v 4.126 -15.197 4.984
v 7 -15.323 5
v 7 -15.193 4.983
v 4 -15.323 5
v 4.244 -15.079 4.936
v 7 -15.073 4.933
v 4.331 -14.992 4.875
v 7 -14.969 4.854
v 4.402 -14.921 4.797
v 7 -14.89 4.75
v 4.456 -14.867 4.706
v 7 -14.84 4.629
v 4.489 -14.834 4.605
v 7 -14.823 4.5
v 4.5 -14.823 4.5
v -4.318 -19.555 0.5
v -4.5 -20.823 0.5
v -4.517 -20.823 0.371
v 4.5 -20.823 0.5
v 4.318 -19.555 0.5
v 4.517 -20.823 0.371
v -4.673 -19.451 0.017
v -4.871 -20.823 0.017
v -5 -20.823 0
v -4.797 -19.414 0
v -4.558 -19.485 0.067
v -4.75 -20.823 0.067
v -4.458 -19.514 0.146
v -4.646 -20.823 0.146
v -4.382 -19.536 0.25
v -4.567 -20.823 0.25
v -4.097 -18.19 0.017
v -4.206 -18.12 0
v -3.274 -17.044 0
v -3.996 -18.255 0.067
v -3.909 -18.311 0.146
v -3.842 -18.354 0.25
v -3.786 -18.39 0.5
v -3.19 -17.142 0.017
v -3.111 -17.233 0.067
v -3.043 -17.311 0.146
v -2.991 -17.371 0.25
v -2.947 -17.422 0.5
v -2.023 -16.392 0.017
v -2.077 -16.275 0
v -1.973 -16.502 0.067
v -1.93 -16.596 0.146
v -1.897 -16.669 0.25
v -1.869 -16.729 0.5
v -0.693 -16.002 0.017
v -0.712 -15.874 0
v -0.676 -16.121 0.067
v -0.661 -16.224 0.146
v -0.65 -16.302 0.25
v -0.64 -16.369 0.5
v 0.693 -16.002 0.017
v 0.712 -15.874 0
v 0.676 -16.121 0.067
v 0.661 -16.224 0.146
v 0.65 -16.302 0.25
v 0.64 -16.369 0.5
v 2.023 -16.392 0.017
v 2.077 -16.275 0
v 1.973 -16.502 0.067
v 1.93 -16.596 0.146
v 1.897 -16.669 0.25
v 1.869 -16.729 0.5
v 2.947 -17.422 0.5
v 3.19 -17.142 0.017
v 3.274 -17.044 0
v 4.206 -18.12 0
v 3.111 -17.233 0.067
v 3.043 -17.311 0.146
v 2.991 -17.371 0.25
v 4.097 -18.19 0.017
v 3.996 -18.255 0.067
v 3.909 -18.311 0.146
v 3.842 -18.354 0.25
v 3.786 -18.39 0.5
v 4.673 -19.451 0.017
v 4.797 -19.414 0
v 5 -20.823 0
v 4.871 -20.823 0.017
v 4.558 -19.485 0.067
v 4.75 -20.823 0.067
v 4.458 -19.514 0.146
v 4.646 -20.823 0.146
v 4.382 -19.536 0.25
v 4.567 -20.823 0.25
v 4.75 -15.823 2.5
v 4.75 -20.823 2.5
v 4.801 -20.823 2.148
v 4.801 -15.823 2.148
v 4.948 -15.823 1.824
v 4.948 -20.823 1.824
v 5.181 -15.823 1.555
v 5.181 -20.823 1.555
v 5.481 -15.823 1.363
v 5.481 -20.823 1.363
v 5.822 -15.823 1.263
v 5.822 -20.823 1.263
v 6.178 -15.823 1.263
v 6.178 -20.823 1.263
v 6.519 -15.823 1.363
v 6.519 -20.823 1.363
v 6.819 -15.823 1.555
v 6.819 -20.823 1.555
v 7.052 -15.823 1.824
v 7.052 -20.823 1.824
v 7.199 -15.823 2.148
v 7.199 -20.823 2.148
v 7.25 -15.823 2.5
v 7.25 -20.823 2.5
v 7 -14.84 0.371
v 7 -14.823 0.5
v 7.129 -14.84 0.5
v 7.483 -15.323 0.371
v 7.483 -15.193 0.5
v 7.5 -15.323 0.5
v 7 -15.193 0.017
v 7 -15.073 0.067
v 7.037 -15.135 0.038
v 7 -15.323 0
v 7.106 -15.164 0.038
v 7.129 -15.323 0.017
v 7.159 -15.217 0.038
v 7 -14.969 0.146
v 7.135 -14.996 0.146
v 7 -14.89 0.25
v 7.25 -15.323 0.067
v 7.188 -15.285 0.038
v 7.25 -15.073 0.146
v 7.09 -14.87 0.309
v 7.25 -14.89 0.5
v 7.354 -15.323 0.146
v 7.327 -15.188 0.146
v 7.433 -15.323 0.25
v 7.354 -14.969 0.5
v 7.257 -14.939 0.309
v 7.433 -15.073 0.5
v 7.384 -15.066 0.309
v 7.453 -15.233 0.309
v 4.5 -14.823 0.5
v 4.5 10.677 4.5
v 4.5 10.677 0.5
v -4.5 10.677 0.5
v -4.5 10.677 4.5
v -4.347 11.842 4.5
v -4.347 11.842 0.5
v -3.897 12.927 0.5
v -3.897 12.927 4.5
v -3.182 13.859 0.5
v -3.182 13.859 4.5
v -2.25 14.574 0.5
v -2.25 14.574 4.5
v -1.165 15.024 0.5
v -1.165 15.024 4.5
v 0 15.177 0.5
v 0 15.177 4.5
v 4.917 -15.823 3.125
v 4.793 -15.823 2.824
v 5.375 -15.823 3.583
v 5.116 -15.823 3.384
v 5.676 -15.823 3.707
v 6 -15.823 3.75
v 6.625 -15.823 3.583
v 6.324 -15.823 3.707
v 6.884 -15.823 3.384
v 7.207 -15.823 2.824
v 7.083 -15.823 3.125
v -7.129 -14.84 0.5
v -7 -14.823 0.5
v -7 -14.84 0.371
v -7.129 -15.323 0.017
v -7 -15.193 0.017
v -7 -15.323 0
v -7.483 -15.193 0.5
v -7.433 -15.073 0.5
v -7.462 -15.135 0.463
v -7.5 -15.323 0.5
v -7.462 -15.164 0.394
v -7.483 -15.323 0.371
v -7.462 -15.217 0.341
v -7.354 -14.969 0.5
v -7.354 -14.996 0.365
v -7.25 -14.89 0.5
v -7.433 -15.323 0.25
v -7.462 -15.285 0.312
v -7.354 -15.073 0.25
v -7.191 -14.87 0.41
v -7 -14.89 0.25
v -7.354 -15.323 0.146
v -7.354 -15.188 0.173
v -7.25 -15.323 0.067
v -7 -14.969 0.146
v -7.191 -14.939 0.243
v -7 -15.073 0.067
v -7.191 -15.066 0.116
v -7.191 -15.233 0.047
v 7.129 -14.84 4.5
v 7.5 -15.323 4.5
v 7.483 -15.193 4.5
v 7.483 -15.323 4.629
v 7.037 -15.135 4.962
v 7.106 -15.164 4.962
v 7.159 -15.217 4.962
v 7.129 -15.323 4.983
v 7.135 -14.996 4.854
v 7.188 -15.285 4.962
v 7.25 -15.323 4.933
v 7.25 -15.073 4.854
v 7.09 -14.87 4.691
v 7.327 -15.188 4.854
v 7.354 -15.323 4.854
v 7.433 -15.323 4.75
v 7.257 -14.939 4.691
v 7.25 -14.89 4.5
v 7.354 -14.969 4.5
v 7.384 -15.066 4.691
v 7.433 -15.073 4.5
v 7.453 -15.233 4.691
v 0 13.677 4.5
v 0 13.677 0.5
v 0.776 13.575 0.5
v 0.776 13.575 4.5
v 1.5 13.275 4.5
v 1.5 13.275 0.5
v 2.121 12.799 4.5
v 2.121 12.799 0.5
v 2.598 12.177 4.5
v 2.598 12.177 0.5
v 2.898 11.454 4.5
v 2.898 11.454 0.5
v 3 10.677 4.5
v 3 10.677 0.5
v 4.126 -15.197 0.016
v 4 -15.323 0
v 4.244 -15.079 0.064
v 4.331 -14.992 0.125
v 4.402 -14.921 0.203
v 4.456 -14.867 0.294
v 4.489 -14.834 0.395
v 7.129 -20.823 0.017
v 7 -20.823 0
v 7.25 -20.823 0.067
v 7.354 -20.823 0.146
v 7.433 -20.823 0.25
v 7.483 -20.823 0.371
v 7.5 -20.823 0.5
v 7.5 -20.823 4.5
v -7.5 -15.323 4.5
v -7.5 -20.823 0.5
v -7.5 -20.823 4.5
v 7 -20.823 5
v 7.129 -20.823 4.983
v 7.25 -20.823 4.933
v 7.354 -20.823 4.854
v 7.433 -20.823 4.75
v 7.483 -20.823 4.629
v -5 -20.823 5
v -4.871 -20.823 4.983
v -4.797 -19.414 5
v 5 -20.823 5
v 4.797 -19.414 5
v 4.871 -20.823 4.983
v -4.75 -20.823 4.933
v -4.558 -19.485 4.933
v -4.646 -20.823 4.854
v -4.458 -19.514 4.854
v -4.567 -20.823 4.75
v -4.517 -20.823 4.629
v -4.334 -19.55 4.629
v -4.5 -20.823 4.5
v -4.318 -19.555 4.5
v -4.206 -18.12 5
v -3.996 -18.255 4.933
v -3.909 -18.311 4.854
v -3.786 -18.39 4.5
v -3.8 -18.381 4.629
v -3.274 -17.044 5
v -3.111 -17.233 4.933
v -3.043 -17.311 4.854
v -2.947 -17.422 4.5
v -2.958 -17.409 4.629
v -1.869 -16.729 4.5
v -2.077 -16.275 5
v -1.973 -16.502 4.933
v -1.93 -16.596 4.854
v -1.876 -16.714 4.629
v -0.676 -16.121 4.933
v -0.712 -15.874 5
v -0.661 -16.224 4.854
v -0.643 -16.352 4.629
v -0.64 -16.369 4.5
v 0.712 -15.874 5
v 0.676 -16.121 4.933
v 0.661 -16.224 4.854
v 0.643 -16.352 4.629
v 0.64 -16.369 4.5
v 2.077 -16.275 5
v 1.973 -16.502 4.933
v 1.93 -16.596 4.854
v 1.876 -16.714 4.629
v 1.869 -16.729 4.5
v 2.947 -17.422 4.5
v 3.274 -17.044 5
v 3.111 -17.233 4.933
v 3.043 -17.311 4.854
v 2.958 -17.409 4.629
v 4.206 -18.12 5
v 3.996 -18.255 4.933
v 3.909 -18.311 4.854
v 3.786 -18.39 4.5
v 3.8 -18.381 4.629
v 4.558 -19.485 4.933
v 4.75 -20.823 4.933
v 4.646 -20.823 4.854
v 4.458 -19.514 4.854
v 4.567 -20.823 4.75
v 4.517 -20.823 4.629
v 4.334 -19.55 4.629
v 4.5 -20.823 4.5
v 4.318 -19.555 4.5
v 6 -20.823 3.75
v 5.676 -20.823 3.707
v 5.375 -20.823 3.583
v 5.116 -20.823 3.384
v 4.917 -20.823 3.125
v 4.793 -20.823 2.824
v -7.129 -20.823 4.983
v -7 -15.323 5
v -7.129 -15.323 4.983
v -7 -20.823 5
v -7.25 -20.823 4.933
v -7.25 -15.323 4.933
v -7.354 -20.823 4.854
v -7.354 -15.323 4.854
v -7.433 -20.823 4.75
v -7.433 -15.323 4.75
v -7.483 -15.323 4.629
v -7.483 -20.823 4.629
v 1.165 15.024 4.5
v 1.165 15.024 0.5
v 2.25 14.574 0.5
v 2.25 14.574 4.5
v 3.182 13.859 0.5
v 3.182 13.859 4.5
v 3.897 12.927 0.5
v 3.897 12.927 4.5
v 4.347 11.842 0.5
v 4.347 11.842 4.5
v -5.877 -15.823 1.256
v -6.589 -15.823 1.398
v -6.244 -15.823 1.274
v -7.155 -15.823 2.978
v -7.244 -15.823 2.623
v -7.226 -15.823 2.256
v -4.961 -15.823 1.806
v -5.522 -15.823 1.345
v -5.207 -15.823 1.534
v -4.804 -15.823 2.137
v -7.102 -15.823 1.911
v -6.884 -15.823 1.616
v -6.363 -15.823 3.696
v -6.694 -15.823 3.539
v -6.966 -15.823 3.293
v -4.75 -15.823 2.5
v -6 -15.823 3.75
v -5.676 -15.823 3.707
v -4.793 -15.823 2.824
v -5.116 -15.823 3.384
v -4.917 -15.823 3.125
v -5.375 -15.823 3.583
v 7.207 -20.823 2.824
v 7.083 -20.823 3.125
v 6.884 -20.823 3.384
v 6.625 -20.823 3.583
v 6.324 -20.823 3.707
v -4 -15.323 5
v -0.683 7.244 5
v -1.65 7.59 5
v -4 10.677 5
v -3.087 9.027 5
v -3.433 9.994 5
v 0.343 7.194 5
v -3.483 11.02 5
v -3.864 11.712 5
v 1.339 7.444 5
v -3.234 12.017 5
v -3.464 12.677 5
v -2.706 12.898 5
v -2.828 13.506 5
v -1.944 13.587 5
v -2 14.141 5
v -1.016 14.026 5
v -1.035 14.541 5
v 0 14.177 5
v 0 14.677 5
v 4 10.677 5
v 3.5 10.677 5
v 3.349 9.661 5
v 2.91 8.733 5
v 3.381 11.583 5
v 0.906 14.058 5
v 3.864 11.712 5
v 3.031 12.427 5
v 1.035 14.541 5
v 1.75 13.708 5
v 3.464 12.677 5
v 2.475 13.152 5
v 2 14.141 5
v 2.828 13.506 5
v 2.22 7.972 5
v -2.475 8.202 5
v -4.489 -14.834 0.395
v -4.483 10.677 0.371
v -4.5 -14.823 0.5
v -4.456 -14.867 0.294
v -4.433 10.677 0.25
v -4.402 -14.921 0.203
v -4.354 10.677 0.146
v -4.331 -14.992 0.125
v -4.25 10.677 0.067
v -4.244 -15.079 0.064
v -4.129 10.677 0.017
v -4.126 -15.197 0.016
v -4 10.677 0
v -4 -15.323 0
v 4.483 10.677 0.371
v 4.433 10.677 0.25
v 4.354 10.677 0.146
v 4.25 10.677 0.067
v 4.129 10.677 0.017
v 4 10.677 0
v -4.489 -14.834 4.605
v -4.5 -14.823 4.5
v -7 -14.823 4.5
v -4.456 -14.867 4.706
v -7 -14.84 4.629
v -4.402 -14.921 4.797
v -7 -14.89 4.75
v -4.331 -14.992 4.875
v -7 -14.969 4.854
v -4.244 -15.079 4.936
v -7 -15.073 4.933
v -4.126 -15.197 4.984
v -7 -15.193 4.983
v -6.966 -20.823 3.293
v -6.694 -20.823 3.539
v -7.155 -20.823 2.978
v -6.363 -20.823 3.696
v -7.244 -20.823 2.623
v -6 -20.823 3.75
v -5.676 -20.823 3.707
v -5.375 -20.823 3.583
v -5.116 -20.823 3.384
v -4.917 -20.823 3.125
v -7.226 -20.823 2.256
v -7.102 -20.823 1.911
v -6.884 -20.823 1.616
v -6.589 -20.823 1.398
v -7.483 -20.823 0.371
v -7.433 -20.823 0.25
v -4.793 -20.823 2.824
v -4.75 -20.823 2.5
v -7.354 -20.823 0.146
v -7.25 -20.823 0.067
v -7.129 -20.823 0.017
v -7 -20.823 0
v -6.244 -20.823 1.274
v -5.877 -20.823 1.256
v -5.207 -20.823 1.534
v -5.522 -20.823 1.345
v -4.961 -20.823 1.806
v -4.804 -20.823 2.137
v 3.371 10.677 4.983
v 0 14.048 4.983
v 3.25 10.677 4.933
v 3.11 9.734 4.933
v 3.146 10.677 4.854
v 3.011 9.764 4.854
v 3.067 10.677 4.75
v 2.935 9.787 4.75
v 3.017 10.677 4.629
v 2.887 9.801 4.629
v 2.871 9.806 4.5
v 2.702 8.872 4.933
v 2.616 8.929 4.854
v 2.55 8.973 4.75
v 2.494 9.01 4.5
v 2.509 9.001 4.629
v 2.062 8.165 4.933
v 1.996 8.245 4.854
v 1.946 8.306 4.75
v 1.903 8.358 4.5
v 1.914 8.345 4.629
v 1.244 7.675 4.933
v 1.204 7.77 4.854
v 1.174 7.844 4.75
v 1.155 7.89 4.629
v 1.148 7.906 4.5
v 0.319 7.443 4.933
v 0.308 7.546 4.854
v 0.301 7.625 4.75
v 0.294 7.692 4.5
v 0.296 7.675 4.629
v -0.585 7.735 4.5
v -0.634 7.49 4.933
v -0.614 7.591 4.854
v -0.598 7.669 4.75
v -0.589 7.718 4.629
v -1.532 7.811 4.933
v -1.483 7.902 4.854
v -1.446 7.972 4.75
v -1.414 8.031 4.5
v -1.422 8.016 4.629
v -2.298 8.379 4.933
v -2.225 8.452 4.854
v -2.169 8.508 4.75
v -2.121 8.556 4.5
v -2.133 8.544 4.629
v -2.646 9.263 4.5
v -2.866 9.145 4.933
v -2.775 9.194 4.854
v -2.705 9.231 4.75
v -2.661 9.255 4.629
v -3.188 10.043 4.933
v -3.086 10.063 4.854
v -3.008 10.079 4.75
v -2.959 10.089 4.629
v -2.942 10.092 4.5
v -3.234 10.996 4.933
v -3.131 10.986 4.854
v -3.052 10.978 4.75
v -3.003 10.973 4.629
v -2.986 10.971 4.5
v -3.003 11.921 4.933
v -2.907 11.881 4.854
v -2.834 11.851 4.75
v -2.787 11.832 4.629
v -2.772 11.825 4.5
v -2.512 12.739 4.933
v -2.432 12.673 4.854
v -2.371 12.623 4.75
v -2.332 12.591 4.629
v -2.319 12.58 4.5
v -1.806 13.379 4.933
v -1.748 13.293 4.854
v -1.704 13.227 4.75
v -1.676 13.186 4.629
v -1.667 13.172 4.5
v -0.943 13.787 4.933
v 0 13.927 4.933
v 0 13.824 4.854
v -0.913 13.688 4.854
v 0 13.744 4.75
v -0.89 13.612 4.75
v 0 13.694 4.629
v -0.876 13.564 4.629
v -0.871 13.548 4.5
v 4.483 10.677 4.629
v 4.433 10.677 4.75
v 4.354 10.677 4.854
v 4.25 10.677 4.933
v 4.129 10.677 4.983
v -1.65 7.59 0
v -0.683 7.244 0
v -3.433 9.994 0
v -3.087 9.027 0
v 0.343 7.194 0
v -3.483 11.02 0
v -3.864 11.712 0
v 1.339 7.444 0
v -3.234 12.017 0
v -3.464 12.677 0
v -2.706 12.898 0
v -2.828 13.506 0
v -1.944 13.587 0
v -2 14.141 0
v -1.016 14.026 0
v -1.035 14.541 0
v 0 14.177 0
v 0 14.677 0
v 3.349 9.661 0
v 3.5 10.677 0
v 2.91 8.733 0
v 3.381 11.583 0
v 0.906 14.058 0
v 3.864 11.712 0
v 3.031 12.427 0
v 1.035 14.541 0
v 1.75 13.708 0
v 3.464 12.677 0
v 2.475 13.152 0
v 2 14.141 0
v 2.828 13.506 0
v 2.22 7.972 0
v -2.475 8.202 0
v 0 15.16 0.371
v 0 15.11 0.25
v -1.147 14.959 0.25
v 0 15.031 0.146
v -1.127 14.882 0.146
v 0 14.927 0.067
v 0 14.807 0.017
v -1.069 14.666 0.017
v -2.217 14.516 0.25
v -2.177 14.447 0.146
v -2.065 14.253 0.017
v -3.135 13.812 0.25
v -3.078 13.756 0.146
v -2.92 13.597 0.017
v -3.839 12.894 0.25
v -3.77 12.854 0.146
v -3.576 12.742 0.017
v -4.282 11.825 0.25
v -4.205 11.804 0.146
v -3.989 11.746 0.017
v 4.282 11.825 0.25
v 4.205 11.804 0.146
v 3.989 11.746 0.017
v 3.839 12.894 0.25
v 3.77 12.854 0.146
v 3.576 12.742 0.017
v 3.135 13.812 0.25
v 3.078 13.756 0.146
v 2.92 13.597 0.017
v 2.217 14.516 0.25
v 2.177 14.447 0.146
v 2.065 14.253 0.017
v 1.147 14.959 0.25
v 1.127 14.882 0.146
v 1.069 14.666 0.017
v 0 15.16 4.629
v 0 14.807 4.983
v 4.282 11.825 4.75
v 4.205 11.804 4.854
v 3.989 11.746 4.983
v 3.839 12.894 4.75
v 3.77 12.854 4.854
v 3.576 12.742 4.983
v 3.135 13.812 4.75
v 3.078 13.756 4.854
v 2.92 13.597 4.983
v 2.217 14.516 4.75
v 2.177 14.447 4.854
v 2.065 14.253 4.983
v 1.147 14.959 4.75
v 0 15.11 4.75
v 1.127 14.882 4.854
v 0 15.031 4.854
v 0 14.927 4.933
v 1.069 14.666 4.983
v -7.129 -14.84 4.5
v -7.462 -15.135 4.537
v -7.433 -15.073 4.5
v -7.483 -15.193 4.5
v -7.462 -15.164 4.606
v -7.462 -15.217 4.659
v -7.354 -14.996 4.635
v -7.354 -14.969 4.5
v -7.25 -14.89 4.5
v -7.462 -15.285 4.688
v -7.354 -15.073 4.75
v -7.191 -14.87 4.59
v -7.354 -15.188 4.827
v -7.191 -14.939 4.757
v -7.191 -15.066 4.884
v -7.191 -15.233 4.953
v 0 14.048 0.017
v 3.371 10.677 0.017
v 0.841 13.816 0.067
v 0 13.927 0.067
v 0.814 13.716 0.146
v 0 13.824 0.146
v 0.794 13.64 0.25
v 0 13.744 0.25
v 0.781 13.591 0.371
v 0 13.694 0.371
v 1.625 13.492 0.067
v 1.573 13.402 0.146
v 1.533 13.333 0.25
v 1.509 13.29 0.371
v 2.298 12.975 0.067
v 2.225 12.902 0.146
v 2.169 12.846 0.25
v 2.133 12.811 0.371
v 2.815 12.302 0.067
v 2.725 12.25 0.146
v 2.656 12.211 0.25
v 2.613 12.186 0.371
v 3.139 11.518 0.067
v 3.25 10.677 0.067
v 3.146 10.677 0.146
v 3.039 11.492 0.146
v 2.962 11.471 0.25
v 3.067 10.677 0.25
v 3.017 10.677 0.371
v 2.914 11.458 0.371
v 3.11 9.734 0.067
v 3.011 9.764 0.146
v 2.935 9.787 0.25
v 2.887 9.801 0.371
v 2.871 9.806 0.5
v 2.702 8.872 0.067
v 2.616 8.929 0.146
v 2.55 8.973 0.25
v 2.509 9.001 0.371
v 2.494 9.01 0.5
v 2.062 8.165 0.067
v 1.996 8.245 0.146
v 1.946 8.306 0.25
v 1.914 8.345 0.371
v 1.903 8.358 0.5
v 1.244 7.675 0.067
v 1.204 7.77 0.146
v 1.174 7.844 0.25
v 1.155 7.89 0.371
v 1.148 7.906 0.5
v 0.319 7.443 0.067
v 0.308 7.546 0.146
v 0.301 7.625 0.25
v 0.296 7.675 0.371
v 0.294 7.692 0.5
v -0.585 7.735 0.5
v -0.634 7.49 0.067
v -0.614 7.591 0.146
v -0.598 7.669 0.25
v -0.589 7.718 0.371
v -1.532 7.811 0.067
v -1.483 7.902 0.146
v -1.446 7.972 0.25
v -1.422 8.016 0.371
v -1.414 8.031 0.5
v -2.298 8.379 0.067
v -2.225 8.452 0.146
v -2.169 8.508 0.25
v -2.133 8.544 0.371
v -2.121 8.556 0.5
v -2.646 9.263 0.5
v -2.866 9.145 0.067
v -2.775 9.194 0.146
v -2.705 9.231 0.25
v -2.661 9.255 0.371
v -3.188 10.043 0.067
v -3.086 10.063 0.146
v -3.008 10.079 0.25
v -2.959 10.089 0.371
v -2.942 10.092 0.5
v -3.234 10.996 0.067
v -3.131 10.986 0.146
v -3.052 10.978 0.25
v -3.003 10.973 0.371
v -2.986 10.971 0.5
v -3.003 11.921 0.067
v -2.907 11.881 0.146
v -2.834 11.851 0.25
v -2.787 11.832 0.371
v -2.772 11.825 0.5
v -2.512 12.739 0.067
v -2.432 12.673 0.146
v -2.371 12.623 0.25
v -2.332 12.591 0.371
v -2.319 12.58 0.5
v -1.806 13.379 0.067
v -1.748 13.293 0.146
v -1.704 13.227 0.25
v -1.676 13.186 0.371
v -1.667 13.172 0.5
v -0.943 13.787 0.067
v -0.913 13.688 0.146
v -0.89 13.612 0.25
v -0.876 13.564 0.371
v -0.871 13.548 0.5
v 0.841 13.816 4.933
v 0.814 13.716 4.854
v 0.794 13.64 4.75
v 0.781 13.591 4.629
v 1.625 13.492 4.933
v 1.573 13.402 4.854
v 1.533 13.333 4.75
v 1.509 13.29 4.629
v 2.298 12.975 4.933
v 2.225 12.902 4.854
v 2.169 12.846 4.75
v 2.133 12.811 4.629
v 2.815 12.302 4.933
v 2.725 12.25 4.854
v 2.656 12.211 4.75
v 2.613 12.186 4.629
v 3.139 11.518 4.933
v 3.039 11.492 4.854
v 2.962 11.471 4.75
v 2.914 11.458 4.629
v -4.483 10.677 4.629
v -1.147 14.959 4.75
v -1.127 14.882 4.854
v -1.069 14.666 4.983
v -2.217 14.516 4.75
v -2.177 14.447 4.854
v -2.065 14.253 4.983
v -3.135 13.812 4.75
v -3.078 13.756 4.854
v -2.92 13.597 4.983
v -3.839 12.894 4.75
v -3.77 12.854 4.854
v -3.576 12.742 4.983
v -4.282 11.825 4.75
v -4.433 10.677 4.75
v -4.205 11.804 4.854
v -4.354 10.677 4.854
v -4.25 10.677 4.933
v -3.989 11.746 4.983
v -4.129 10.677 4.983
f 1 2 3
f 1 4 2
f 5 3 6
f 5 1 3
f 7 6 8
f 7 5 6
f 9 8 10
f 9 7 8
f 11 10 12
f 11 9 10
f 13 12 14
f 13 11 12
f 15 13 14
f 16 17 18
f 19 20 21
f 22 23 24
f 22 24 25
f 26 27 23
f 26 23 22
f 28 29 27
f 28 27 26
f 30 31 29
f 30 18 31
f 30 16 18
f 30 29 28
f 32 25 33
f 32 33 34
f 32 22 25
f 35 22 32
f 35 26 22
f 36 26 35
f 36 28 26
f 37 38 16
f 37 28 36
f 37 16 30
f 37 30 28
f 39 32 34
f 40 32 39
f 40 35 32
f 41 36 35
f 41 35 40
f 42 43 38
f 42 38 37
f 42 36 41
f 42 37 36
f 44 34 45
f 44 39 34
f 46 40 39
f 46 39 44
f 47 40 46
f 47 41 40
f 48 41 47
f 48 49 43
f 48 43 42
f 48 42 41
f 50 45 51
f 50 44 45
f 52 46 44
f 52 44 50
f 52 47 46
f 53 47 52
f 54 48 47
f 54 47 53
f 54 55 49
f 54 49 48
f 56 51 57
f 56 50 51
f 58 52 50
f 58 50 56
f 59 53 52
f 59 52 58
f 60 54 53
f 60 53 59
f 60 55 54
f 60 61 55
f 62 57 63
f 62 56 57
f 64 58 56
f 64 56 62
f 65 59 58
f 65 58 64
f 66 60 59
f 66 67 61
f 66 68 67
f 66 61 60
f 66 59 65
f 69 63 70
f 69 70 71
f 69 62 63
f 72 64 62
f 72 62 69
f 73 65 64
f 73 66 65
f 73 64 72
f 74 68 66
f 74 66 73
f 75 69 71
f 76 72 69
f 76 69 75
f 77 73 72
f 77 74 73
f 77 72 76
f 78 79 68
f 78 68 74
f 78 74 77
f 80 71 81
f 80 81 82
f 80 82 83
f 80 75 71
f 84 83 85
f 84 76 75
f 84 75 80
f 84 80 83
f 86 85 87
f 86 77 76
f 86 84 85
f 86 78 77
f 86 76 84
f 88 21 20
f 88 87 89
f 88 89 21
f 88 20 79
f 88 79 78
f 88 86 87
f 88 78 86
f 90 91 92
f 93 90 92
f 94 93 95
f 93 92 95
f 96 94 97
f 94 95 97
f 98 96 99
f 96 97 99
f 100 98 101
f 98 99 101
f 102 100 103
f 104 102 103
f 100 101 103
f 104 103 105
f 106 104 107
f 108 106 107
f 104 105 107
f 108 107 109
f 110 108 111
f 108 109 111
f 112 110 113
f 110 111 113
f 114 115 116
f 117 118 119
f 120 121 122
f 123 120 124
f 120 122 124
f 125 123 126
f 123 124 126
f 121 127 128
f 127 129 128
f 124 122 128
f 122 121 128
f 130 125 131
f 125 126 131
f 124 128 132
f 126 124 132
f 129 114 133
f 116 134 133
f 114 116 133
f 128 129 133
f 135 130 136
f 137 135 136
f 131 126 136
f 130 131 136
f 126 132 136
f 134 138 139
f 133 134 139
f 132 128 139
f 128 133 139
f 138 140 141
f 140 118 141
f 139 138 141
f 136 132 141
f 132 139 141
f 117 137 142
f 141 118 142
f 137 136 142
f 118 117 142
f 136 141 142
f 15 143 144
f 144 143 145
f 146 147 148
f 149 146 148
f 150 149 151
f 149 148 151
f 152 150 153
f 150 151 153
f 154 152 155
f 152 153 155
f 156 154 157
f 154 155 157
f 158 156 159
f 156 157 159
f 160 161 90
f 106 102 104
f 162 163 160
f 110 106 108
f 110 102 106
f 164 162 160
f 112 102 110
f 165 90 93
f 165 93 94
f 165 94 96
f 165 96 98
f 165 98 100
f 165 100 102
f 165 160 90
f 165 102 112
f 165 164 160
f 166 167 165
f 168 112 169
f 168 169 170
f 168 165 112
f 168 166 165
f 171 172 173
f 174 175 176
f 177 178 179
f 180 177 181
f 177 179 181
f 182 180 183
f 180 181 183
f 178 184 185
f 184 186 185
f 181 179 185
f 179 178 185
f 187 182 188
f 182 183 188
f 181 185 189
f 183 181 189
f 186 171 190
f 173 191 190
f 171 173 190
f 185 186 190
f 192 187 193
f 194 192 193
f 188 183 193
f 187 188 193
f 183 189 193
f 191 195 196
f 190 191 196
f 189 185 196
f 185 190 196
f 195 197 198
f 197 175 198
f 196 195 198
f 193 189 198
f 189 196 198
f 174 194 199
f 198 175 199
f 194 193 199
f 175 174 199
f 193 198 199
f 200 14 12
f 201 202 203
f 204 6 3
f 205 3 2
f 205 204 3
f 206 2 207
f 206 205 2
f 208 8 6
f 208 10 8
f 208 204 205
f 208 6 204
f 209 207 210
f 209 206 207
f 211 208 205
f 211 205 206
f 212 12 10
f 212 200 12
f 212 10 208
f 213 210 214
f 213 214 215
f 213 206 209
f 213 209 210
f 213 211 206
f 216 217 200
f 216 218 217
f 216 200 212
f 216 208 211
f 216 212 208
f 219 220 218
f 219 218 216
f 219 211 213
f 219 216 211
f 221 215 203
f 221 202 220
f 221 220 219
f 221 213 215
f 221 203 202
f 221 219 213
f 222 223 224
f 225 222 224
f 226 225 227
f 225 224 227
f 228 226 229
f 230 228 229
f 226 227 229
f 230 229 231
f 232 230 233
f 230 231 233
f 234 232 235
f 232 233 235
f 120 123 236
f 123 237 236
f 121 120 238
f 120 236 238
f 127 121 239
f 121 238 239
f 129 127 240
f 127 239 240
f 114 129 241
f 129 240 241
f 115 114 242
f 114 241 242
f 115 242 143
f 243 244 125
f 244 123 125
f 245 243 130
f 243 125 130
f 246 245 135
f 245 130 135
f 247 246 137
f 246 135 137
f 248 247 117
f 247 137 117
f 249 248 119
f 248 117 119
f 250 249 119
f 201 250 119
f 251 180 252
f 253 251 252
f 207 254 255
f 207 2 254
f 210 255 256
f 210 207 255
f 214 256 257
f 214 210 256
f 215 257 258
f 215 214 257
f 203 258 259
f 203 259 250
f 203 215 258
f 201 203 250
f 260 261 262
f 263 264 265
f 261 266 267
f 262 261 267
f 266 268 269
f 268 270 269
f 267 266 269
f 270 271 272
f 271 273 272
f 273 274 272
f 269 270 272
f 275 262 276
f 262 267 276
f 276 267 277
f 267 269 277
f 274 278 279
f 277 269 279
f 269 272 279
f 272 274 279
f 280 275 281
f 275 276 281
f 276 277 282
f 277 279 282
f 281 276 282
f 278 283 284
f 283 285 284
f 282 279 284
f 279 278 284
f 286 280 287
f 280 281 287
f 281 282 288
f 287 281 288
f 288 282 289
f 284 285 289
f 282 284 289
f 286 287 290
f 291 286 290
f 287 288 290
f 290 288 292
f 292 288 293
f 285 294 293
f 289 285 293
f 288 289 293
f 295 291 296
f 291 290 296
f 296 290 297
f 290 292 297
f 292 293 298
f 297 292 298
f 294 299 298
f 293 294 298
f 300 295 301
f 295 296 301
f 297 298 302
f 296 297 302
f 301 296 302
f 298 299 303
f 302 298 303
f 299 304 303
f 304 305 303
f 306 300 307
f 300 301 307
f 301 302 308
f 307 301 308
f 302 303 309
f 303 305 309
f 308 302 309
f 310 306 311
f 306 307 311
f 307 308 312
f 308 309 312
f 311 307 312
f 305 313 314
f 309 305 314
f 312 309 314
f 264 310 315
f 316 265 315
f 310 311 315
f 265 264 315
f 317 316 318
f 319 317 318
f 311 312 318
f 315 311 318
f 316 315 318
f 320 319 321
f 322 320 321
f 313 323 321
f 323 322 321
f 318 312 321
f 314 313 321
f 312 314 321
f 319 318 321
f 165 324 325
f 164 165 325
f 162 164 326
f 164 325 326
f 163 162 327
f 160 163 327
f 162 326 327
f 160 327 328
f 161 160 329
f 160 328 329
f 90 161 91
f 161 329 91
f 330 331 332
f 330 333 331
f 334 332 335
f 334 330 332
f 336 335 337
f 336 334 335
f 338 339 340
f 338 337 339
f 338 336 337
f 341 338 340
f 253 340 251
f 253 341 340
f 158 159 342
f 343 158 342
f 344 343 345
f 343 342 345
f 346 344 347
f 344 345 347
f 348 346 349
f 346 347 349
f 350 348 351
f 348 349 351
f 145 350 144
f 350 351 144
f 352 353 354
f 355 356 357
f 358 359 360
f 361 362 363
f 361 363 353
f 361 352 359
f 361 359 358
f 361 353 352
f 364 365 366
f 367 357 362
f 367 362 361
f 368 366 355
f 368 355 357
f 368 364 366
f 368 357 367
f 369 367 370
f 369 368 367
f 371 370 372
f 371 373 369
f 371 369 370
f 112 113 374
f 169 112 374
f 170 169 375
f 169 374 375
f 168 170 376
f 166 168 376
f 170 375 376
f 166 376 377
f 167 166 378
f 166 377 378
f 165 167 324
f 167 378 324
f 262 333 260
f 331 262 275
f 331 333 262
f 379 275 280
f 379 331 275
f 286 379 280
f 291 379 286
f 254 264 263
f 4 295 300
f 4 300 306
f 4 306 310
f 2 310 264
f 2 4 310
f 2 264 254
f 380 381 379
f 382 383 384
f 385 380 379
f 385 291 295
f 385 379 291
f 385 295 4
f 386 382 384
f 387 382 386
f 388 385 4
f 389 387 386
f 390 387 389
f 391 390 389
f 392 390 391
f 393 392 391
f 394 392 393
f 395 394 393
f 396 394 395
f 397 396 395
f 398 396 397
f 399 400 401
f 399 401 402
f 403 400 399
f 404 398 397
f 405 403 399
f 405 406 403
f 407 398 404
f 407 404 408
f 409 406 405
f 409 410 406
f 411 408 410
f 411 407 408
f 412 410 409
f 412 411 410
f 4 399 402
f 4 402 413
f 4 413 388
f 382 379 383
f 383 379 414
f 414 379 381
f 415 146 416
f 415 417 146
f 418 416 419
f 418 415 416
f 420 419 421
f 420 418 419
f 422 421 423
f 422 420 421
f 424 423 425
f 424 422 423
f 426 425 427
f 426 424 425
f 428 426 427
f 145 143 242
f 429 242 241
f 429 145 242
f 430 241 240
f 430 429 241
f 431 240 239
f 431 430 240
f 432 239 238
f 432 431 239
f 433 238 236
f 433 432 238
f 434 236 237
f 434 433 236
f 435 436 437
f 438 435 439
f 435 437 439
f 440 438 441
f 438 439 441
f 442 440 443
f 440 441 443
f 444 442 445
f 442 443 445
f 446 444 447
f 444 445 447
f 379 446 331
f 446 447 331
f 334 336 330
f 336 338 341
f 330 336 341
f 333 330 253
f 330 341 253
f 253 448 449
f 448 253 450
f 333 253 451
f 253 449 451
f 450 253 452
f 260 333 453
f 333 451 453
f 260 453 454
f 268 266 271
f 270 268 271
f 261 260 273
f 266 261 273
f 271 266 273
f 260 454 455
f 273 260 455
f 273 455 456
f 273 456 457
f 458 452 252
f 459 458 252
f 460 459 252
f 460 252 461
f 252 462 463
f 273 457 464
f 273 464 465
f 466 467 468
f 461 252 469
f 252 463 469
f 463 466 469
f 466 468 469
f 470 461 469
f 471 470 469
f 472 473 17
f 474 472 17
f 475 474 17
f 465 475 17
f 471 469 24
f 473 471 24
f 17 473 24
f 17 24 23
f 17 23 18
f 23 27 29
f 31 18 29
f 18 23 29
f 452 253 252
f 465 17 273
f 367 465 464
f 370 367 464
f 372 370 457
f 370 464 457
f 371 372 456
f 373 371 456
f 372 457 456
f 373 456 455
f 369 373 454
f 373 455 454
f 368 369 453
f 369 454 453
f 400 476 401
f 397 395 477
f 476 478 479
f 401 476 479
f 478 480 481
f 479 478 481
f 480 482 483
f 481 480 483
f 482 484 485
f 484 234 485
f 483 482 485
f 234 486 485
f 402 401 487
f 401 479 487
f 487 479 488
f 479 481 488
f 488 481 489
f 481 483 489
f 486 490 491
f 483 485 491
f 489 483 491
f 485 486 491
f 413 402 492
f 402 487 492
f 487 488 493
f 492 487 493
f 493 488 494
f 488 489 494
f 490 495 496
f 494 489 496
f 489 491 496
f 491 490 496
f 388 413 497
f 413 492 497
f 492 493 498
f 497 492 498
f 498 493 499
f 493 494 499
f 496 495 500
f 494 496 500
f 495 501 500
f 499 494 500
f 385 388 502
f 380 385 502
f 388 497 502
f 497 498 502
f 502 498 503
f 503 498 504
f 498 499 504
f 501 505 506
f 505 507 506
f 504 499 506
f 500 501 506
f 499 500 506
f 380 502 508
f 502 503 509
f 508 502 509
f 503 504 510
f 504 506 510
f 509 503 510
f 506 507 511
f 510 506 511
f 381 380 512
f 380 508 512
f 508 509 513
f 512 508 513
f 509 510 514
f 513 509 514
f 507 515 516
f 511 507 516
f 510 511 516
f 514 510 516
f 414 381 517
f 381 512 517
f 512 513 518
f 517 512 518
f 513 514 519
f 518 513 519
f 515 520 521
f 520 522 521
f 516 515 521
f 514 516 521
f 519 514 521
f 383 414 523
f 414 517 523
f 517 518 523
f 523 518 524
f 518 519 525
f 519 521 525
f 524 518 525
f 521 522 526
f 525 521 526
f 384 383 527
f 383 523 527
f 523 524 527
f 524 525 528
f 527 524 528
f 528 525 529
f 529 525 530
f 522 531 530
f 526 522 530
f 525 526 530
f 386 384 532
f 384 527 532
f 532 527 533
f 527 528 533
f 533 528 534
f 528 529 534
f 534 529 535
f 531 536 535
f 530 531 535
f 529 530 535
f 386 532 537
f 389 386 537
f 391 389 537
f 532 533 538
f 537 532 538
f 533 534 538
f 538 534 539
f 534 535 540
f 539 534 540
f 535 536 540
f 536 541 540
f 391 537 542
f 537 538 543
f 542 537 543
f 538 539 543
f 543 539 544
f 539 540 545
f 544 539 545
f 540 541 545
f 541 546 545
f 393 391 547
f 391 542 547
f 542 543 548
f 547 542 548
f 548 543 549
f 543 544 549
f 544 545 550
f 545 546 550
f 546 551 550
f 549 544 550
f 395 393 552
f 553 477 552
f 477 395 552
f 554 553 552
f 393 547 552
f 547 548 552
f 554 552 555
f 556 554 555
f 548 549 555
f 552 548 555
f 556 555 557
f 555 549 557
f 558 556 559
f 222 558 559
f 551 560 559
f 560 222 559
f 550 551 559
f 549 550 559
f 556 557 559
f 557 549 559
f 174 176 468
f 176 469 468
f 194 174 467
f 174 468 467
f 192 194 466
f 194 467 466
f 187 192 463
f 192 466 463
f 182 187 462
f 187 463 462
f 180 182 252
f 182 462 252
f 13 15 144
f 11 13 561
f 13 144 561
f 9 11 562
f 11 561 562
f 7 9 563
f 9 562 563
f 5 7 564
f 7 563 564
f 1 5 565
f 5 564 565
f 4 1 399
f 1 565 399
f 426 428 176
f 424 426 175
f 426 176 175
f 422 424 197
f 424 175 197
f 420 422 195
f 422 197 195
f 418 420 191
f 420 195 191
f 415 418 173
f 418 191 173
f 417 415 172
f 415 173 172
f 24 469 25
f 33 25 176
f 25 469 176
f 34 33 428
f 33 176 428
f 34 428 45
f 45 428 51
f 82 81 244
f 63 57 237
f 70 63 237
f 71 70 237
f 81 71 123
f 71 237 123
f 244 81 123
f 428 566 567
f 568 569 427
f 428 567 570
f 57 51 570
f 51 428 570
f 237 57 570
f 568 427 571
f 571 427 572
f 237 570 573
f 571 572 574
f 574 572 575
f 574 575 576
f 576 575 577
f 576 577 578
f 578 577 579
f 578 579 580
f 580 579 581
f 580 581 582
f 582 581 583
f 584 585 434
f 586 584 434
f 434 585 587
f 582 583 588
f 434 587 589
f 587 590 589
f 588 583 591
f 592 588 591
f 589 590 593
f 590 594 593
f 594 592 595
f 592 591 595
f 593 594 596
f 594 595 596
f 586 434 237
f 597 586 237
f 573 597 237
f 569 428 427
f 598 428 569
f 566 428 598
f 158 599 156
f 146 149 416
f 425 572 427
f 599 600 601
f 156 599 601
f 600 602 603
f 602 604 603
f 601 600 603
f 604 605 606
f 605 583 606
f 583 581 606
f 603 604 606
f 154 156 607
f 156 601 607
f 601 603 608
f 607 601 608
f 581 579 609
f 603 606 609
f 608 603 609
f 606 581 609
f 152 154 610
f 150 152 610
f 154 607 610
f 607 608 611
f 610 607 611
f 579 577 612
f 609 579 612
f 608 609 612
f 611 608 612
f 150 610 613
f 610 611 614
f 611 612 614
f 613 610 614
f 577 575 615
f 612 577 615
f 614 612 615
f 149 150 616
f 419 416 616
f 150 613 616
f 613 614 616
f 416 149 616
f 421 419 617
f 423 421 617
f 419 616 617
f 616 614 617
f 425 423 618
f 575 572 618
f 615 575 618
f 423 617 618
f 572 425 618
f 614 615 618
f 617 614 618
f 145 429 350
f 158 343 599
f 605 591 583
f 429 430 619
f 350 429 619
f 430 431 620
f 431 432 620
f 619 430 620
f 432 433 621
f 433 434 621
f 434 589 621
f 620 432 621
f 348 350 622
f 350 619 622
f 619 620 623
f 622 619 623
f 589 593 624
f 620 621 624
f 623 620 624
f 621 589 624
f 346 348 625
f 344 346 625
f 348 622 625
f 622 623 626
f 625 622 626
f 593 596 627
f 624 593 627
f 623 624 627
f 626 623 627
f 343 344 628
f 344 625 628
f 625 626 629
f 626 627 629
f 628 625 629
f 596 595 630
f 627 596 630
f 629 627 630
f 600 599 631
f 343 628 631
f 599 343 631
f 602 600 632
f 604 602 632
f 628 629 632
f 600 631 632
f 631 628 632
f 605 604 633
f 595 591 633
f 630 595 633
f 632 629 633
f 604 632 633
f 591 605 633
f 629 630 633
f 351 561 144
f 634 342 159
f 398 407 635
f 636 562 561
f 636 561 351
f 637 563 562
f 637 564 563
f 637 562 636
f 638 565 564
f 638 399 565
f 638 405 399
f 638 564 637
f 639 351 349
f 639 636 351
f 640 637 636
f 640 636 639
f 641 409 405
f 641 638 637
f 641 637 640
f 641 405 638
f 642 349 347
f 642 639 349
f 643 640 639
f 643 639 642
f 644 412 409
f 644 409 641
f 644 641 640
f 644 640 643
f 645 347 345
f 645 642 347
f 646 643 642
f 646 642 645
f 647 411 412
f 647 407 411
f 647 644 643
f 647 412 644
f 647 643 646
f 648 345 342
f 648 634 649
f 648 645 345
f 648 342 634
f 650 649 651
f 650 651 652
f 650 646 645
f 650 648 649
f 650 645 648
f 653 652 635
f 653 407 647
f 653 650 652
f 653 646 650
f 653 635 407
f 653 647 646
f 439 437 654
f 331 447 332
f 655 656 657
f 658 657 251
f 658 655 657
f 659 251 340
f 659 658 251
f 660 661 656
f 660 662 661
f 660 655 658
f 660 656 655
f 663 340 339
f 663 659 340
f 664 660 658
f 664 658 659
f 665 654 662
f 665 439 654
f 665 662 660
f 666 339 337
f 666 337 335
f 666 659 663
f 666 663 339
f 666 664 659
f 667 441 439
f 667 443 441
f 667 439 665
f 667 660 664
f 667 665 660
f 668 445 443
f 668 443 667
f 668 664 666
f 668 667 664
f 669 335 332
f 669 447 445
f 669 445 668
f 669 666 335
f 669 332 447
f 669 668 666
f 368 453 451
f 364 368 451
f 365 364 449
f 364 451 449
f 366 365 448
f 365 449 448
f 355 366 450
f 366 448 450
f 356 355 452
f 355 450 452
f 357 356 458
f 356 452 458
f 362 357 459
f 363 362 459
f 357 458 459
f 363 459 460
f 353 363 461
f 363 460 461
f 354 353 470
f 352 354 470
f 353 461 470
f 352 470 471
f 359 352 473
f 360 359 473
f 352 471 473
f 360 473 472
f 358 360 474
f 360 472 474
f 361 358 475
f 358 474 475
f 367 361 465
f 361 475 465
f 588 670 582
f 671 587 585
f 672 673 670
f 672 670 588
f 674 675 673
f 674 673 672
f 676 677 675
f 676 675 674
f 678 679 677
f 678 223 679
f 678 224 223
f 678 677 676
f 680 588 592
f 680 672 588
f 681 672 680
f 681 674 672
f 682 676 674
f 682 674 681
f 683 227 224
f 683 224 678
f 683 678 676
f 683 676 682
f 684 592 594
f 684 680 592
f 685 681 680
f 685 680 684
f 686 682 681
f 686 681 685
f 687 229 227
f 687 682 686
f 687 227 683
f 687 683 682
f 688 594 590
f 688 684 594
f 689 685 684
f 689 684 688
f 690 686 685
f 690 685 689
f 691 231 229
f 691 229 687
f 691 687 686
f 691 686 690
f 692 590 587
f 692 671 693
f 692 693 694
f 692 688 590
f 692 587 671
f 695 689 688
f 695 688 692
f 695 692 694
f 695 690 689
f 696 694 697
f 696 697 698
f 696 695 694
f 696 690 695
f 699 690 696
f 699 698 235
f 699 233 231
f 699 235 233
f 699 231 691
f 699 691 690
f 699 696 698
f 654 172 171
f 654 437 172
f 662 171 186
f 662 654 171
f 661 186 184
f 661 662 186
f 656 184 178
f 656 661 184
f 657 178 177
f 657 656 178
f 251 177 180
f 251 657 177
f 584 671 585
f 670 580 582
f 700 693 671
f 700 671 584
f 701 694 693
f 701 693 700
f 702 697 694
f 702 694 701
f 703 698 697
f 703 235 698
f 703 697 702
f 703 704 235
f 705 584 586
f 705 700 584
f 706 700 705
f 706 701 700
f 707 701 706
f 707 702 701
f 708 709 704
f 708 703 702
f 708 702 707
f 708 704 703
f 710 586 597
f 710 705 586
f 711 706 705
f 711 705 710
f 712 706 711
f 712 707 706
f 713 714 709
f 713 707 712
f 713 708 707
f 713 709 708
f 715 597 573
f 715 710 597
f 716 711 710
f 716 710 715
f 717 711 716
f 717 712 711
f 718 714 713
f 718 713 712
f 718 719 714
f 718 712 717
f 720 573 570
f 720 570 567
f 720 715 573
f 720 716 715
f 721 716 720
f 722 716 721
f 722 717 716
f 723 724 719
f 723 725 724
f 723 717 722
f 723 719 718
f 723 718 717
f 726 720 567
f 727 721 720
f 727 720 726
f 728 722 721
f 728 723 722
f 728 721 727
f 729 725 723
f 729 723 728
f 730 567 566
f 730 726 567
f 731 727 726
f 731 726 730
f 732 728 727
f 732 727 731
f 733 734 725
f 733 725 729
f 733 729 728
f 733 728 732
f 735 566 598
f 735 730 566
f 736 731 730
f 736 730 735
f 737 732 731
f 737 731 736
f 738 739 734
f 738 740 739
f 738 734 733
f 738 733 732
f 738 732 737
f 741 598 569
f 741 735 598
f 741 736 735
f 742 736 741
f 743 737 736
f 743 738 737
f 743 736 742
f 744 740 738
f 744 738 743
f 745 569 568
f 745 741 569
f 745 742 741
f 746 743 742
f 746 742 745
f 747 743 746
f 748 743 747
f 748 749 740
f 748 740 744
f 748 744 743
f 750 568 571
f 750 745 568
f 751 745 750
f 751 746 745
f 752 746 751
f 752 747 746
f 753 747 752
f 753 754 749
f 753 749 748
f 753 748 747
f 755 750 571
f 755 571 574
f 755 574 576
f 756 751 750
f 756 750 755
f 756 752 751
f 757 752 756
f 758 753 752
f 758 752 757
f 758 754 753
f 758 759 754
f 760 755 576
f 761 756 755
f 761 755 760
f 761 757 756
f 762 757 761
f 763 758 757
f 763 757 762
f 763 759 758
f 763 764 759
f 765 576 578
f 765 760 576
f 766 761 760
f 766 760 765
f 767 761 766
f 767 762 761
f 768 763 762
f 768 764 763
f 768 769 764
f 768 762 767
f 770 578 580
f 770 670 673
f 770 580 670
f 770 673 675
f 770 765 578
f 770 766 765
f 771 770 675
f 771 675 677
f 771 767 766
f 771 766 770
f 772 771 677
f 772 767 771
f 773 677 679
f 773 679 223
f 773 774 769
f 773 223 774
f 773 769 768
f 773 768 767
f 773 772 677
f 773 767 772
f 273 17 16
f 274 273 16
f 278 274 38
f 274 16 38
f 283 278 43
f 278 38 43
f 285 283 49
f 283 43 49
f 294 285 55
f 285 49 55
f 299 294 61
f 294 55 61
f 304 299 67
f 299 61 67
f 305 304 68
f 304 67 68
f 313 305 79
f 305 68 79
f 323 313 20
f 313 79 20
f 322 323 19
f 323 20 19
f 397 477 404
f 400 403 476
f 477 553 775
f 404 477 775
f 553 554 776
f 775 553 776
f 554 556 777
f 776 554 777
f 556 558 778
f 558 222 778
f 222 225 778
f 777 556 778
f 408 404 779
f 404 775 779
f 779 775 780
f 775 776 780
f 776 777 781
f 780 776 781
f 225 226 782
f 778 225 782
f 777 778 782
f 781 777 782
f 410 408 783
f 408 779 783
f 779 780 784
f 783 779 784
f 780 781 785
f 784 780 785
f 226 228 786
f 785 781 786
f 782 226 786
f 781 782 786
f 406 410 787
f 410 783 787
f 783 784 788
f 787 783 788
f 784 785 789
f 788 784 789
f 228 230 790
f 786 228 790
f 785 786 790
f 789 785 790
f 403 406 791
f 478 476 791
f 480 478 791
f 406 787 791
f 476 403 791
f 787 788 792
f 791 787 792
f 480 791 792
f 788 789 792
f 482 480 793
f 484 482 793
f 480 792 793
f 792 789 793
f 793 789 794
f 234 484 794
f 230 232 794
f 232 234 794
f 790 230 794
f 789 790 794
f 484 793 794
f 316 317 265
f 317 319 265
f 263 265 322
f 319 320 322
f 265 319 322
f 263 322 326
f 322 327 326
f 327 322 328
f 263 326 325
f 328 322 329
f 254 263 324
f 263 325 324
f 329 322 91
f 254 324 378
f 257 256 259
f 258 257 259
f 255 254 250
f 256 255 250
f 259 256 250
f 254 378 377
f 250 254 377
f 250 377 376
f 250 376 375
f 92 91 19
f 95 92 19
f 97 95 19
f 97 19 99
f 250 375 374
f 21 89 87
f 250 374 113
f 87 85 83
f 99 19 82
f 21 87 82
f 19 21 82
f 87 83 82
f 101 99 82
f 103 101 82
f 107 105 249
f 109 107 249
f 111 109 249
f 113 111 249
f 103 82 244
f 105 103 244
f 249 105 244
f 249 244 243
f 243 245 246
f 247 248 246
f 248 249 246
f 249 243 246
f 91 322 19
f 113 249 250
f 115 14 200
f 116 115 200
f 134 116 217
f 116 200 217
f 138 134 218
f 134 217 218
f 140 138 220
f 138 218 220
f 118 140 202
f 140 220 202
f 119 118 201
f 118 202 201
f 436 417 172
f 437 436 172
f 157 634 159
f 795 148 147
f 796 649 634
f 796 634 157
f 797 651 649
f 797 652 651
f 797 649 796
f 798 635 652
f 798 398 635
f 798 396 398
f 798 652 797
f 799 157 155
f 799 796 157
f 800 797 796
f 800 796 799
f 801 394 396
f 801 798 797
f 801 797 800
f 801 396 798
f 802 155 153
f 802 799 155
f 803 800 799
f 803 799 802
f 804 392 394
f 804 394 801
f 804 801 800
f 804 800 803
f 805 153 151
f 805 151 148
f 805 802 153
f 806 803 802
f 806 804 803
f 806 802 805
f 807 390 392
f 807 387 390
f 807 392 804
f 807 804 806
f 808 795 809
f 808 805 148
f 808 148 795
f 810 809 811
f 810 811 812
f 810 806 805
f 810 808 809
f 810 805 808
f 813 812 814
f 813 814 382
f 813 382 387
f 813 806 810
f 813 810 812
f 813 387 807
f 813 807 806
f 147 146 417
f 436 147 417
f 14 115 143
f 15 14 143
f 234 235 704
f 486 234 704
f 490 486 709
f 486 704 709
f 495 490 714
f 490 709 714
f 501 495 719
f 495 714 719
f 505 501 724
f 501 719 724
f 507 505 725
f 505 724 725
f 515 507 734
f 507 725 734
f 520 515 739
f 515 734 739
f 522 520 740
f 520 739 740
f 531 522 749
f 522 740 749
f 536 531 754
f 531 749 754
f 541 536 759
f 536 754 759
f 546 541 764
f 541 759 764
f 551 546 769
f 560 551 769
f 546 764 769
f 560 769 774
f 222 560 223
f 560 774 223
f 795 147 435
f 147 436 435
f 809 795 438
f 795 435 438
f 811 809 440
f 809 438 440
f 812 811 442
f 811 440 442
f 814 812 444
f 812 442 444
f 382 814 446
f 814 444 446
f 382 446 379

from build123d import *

# Parameters (mm, degrees)
F1_DEPTH = 5
F2_R     = 4.49999
F3_R     = 0.5
F5_DEPTH = 5


# Not quite as in the source:
# - a fillet or chamfer is up to 0.001 mm smaller than in the source, because OpenCascade refuses the exact size
# - a feature names something its author has since deleted; it is built from what else it names


with BuildPart() as f1:
    # F0 (on Top) → F1 (new body)
    with BuildSketch(Plane.XY):
        with BuildLine():
            Line((4.5, -14.8228148893), (-4.5, -14.8228148893))
            Line((-4.5, -14.8228148893), (-7.5, -14.8228148893))
            Line((-7.5, -14.8228148893), (-7.5, -20.8228148893))
            Line((-7.5, -20.8228148893), (-4.5, -20.8228148893))
            ThreePointArc((-4.5, -20.8228148893), (0, -16.3228148893), (4.5, -20.8228148893))
            Line((4.5, -20.8228148893), (7.5, -20.8228148893))
            Line((7.5, -20.8228148893), (7.5, -14.8228148893))
            Line((7.5, -14.8228148893), (4.5, -14.8228148893))
        make_face()
        Polygon((0, 15.1771851107), (-4.5, 15.1771851107), (-4.5, -14.8228148893), (4.5, -14.8228148893), (4.5, 15.1771851107), align=None)
        with BuildLine():
            ThreePointArc((3, 10.6771851107), (-2.1213203436, 8.5558647672), (0, 13.6771851107))
            ThreePointArc((0, 13.6771851107), (2.1213203436, 12.7985054543), (3, 10.6771851107))
        make_face(mode=Mode.SUBTRACT)
    extrude(amount=F1_DEPTH)

    # F2 (radius 4.5 in the source; OpenCascade refuses exactly that, so slightly less here)
    f2_edges = [f1.edges().sort_by_distance(p)[0] for p in [
        (4.5, 15.177185, 2.5),
        (-4.5, 15.177185, 2.5),
    ]]
    fillet(f2_edges, radius=F2_R)

    # F3
    f3_edges = [f1.edges().sort_by_distance(p)[0] for p in [
        (-4.5, -2.07281, 5),
        (-4.5, -2.07281, 0),
        (-6, -14.822815, 5),
        (-6, -14.822815, 0),
        (-7.5, -14.822815, 2.5),
        (7.5, -14.822815, 2.5),
        (6, -14.822815, 0),
        (6, -14.822815, 5),
        (-7.5, -17.822815, 0),
        (-7.5, -17.822815, 5),
        (7.5, -17.822815, 5),
        (7.5, -17.822815, 0),
        (-3, 10.677185, 5),
        (-3, 10.677185, 0),
        (0, -16.322815, 5),
        (0, -16.322815, 0),
        (4.5, -2.07281, 0),
        (4.5, -2.07281, 5),
        (3.181983, 13.859169, 0),
        (0, 15.177185, 0),
        (-3.181983, 13.859169, 0),
        (3.181983, 13.859169, 5),
        (0, 15.177185, 5),
        (-3.181983, 13.859169, 5),
    ]]
    fillet(f3_edges, radius=F3_R)

    # F4 (on face) → F5 (cut)
    with BuildSketch(Plane.XZ.offset(20.8228148893)):
        with BuildLine():
            ThreePointArc((7.25, 2.5), (6.8838834765, 3.3838834765), (6, 3.75))
            Line((6, 3.75), (6, 2.5))
            Line((6, 2.5), (4.75, 2.5))
            ThreePointArc((4.75, 2.5), (6, 1.25), (7.25, 2.5))
        make_face()
        with BuildLine():
            Line((6, 2.5), (6, 3.75))
            ThreePointArc((6, 3.75), (5.1161165235, 3.3838834765), (4.75, 2.5))
            Line((4.75, 2.5), (6, 2.5))
        make_face()
        with BuildLine():
            Line((-6, 2.5), (-6, 3.75))
            ThreePointArc((-6, 3.75), (-6.8838834765, 1.6161165235), (-4.75, 2.5))
            Line((-4.75, 2.5), (-6, 2.5))
        make_face()
        with BuildLine():
            ThreePointArc((-4.75, 2.5), (-5.1161165235, 3.3838834765), (-6, 3.75))
            Line((-6, 3.75), (-6, 2.5))
            Line((-6, 2.5), (-4.75, 2.5))
        make_face()
    extrude(amount=-F5_DEPTH, mode=Mode.SUBTRACT)


solid = f1.part
